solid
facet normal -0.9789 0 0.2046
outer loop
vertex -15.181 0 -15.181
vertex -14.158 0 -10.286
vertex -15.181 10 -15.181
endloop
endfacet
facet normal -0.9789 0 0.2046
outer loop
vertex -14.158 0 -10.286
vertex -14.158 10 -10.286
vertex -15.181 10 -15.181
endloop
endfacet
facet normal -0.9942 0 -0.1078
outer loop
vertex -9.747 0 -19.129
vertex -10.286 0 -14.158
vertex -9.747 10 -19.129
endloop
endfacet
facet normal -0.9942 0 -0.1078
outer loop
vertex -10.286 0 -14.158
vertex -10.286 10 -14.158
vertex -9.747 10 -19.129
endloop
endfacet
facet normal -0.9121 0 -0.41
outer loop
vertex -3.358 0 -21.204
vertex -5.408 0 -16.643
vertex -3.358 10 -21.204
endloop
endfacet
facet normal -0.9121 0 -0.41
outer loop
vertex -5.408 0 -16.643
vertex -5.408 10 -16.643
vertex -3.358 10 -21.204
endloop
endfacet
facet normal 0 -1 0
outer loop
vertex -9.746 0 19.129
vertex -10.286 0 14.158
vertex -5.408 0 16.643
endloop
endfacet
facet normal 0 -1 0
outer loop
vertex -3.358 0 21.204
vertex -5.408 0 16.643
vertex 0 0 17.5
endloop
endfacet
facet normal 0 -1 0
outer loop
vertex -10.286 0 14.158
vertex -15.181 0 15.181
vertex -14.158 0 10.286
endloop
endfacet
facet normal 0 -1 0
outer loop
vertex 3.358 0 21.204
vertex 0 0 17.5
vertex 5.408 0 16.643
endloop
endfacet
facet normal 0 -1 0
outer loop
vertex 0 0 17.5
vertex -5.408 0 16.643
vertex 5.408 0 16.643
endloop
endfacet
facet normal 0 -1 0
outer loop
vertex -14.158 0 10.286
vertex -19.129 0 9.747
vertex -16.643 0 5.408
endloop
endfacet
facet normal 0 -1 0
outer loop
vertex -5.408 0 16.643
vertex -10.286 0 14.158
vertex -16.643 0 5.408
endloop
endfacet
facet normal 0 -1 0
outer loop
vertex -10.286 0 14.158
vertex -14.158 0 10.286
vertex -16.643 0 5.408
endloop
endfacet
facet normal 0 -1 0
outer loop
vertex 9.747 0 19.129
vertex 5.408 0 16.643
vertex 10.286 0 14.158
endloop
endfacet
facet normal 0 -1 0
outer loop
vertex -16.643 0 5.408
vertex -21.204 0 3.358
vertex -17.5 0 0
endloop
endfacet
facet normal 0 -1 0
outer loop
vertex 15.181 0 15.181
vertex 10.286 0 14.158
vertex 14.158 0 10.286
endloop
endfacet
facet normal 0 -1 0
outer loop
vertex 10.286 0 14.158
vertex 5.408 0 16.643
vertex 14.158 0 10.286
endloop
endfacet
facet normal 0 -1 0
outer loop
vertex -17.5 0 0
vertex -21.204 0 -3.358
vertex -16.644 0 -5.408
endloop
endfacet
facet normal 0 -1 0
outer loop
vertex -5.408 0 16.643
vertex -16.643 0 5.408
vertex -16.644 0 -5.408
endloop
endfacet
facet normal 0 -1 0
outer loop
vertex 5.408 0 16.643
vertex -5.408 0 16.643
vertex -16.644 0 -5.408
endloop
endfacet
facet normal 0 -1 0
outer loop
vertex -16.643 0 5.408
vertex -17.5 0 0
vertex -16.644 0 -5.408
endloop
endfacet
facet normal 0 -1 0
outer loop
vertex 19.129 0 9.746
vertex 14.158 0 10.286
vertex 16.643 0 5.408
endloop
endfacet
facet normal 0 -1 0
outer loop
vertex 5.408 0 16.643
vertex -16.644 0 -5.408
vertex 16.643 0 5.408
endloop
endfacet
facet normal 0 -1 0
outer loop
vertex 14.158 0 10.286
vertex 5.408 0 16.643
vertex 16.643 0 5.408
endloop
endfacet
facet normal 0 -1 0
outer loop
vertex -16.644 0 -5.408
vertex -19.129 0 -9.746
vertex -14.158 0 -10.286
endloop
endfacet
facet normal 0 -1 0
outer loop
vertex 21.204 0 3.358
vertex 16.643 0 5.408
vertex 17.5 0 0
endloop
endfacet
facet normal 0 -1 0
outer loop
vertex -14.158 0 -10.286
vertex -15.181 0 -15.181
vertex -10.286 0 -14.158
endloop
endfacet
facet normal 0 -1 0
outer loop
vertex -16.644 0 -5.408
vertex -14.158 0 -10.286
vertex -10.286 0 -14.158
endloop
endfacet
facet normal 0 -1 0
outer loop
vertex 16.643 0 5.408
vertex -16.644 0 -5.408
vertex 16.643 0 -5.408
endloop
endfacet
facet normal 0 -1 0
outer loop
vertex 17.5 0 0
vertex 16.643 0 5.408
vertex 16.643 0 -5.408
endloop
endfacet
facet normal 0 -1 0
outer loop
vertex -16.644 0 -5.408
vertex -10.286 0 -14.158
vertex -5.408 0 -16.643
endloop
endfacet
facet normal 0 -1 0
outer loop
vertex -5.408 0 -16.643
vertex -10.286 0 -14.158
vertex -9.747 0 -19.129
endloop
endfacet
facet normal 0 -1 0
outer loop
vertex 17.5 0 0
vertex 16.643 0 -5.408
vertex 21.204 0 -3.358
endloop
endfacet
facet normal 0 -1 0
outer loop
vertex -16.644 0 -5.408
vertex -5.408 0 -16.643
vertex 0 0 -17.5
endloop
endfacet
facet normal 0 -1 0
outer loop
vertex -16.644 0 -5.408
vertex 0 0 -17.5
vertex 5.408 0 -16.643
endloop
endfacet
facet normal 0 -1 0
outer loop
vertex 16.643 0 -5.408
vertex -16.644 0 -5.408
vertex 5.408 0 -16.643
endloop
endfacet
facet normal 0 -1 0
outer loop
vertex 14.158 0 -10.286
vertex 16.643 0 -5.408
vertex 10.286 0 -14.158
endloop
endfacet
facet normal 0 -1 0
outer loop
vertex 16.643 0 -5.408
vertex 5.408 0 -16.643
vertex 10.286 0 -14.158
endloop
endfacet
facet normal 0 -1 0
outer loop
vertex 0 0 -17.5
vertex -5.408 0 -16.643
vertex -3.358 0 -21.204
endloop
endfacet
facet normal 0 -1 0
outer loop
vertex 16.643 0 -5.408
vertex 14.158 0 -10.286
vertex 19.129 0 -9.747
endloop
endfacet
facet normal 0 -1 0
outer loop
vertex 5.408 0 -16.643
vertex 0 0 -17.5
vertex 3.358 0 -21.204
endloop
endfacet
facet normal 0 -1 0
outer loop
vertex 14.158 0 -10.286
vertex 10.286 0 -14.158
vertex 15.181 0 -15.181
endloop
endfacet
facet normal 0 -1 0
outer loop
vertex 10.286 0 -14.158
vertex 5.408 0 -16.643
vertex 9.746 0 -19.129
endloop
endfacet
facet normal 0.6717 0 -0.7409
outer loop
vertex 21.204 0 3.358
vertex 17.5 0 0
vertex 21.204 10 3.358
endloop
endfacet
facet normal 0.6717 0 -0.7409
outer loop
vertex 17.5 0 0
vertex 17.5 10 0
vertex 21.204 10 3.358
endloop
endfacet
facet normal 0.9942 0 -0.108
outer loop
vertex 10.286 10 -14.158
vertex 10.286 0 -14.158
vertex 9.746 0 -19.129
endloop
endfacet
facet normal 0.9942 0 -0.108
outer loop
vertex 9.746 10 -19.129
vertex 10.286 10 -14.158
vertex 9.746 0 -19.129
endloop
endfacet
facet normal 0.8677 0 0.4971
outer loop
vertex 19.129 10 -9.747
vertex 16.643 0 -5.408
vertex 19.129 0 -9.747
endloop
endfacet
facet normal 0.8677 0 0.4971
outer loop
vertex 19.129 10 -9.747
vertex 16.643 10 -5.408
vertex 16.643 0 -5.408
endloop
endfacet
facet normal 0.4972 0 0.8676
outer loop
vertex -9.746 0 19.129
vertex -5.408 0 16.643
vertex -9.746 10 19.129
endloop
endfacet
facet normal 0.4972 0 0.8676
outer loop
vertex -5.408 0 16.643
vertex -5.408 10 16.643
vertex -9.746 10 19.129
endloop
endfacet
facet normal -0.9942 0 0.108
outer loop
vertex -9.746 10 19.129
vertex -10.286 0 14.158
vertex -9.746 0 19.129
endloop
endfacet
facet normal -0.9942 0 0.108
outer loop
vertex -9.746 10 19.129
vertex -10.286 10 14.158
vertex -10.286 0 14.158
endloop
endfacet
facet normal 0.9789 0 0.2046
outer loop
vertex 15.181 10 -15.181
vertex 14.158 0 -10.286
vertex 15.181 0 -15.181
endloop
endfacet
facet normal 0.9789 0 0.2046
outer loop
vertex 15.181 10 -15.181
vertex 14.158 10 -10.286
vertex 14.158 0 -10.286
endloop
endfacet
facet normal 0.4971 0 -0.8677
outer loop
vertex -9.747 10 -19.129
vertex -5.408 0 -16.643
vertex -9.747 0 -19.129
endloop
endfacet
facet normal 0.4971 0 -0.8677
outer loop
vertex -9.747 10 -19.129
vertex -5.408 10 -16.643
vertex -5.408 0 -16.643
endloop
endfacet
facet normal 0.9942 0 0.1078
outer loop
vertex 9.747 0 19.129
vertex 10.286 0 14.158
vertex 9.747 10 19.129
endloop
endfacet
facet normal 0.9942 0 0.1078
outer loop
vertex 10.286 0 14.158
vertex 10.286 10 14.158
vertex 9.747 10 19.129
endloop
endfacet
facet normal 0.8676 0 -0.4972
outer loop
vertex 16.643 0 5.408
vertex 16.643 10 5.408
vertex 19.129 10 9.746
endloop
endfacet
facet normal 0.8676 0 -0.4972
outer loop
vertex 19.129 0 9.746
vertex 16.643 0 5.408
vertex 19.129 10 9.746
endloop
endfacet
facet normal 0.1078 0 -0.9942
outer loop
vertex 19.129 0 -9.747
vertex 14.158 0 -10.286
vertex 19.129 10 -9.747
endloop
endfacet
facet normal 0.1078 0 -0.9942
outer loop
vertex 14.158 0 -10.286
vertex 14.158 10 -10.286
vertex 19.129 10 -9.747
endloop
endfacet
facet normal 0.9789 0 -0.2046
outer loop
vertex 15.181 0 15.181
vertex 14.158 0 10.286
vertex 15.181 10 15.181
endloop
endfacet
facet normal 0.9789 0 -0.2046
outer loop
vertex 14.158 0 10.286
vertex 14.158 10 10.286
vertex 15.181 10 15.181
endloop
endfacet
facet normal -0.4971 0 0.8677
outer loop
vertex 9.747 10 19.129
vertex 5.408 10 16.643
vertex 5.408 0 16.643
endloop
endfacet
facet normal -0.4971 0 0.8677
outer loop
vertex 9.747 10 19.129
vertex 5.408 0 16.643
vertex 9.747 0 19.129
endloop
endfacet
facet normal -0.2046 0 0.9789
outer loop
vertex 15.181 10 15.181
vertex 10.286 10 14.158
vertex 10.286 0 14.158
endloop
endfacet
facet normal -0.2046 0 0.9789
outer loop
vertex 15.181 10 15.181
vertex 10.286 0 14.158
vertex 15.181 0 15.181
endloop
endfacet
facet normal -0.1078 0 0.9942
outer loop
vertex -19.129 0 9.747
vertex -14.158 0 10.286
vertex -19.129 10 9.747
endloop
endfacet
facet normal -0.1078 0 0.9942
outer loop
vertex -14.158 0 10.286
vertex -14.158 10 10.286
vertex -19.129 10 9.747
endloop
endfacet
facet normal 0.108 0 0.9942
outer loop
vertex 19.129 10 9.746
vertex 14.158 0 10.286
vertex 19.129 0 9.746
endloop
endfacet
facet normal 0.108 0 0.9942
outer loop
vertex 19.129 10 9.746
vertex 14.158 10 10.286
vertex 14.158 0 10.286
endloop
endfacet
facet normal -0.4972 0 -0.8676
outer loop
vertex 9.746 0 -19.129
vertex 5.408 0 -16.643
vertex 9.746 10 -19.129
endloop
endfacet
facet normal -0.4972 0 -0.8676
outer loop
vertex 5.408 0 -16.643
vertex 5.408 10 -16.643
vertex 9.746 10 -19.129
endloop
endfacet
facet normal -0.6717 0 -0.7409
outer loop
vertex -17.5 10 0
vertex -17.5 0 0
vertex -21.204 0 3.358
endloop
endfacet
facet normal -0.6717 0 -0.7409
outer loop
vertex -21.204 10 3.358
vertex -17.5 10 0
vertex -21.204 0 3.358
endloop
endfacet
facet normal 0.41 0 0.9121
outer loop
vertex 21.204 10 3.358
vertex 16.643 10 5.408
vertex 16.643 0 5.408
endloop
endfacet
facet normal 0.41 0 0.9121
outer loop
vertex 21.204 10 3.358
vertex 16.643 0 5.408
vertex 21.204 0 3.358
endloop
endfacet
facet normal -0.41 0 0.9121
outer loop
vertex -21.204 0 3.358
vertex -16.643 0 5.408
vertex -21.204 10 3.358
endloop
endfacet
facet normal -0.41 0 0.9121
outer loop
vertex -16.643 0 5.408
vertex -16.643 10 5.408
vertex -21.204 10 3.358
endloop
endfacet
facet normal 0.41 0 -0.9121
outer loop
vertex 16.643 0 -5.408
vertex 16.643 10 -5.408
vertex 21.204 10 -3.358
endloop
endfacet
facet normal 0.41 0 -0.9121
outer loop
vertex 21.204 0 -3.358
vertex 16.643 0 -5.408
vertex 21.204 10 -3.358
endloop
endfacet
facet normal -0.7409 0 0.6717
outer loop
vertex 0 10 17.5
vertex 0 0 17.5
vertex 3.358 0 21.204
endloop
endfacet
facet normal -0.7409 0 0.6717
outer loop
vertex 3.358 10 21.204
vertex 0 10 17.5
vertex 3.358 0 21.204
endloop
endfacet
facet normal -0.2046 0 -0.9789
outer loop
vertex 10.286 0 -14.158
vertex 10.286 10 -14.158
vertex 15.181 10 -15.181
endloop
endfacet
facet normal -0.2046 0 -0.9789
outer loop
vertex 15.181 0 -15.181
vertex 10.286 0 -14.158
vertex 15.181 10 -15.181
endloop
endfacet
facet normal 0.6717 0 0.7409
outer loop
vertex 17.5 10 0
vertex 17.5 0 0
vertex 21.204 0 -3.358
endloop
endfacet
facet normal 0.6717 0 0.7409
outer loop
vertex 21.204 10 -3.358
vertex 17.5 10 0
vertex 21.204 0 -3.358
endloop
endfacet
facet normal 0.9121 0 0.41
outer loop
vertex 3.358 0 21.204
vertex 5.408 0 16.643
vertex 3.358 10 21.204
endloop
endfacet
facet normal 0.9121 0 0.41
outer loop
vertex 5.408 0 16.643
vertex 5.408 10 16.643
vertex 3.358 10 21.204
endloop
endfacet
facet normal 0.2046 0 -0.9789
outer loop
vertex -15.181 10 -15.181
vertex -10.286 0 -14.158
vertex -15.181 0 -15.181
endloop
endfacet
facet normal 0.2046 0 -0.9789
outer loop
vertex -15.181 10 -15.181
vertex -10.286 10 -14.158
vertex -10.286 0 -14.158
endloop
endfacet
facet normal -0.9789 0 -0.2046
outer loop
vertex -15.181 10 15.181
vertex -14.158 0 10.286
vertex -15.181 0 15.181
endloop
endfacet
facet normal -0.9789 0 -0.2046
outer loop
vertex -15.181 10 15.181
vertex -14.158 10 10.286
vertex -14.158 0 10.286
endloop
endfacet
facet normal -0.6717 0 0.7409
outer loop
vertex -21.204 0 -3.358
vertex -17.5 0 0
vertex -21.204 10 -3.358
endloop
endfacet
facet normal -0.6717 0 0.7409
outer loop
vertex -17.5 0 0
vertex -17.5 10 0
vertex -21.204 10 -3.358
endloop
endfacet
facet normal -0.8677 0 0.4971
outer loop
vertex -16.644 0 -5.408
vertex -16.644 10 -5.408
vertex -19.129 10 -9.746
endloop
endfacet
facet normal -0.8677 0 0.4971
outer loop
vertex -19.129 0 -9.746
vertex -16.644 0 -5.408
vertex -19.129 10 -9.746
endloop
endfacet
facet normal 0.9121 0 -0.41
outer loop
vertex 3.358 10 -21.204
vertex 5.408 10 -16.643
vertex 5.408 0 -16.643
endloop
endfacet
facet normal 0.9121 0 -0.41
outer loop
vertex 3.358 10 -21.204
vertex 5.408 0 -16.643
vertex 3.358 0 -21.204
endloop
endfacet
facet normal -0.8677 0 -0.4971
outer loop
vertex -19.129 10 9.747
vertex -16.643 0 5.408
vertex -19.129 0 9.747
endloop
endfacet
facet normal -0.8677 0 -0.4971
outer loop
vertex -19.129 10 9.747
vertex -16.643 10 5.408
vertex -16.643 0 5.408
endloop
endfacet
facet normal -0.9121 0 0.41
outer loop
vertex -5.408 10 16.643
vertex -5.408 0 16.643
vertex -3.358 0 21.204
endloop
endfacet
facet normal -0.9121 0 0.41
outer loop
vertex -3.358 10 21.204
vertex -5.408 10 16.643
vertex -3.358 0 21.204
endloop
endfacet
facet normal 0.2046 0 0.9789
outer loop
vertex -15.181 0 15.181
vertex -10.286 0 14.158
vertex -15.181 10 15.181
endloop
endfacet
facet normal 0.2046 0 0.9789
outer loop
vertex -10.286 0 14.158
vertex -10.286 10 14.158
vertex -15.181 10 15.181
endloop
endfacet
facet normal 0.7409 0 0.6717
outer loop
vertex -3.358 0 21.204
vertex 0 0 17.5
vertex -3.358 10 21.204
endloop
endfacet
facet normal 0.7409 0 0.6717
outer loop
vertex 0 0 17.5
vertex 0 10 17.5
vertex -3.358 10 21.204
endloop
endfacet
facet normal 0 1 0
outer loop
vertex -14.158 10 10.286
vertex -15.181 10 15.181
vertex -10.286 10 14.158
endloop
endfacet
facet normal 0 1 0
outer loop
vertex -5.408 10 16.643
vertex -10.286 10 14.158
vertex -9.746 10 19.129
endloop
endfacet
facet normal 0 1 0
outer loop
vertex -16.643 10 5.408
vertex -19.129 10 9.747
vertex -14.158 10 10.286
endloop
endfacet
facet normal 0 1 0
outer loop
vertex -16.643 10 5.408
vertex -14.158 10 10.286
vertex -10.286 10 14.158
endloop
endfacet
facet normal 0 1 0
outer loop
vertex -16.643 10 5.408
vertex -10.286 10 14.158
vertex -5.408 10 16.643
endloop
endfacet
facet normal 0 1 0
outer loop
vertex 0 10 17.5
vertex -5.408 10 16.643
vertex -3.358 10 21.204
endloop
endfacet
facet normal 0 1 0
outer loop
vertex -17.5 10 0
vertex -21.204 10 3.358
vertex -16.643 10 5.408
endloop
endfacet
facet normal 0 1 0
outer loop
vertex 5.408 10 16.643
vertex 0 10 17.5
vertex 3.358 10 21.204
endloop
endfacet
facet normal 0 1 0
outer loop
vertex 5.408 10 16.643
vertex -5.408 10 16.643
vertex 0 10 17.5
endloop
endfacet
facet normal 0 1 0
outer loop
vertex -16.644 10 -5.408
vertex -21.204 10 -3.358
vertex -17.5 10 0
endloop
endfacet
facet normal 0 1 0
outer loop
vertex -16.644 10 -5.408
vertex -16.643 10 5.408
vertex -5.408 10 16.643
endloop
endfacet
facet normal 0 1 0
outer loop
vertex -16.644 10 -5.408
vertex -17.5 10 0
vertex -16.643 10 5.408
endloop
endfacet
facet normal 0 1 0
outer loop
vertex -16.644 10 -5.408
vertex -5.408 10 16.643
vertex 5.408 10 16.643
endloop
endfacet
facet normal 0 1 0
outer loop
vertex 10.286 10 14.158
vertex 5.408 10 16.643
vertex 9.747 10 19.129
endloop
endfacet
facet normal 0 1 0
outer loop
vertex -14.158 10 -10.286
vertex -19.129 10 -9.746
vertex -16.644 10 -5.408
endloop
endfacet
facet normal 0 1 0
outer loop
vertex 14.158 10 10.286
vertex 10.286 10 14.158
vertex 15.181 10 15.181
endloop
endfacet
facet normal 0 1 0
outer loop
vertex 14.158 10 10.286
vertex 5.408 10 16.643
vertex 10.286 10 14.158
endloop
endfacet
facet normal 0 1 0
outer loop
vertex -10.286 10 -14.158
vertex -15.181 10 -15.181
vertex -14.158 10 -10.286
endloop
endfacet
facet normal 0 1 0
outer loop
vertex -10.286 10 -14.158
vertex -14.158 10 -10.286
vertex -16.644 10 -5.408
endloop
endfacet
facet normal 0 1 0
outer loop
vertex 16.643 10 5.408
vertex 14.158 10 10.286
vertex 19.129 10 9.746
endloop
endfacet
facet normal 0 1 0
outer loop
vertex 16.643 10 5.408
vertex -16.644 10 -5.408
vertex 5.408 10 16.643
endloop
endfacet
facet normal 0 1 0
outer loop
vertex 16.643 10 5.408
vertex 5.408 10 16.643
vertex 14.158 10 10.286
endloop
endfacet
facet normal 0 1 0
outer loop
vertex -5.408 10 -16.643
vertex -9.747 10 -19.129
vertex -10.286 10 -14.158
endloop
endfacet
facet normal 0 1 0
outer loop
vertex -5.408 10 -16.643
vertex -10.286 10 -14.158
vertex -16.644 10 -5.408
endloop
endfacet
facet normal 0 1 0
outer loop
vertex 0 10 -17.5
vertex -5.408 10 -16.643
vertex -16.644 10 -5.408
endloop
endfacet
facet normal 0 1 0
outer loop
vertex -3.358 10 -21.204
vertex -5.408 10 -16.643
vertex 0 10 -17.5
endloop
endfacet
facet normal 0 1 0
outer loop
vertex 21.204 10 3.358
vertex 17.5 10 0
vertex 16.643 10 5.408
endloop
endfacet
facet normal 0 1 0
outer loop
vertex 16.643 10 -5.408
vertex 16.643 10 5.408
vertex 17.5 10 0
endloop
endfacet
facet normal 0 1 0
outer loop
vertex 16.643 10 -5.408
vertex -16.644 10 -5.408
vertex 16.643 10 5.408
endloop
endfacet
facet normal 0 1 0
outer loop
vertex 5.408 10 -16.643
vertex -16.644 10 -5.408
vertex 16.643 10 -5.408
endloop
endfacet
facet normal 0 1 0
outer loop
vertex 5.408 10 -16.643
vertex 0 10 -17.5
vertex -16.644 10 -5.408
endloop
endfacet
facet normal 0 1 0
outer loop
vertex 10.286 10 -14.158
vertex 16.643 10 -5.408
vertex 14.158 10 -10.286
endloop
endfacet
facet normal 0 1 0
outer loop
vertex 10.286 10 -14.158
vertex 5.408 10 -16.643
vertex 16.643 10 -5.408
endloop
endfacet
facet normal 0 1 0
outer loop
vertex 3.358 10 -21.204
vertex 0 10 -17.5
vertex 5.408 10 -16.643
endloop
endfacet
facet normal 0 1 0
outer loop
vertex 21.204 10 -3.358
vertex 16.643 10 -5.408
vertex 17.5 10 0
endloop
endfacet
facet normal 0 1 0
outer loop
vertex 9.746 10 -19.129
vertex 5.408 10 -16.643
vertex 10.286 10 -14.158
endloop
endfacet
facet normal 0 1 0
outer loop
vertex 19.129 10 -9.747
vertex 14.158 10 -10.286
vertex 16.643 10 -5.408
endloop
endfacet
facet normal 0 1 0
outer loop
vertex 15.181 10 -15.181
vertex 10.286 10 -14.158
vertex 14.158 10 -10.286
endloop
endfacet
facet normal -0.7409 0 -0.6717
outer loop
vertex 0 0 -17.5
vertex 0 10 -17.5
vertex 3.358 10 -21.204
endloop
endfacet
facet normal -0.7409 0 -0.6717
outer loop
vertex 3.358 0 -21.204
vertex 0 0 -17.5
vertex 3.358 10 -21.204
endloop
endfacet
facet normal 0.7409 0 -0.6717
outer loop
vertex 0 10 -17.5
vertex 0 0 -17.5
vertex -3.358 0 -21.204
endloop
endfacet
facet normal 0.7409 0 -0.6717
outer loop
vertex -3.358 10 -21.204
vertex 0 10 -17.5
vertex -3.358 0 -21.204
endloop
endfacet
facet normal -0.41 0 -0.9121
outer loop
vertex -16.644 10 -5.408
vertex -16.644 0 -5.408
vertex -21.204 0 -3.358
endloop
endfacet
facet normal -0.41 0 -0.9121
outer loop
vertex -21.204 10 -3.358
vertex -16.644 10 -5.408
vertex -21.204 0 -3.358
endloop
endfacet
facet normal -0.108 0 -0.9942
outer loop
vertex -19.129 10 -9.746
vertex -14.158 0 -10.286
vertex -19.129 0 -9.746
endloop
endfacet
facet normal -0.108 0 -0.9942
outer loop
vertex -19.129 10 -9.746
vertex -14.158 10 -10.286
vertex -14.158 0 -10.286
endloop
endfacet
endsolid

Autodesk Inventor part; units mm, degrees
ref_plane "YZ Plane" through (0, 0, 0) normal (1, 0, 0) x (0, 1, 0)
ref_plane "XZ Plane" through (0, 0, 0) normal (0, 1, 0) x (-1, 0, 0)
ref_plane "XY Plane" through (0, 0, 0) normal (0, 0, 1) x (1, 0, 0)
sketch "Sketch1" plane through (0, 0, 0) normal (0, 1, 0) x (-1, 0, 0)
  circle A0 centre (0, 0) radius 17.5
  dimension "d0" = 35
extrude "Base" add sketch "Sketch1" along normal blind 10
sketch "Sketch2" plane through (0, 10, 0) normal (0, 1, 0) x (1, 0, 0)
  circle A0 centre (0, 0) radius 8
  circle A1 centre (-8, 0) radius 0.8
  dimension "d3" = 16
  dimension "d4" = 1.6
extrude "Mounting Hole" cut sketch "Sketch2" against normal through all contours A1 A0 | A0 A1 picked at (-7.7304, 0) picked at (-8.2616, 0.0332)
pattern_circular "Circular Pattern1" count 8 over 360 about axis through (0, 0, 0) along (0, 1, 0) of "Mounting Hole"
sketch "Sketch3" plane through (0, 10, 0) normal (0, 1, 0) x (1, 0, 0)
  arc A0 (-16.6435, 5.4078) -> (-17.5, 0) centre (0, 0) ccw
  line L0 (0, 0) -> (-16.6435, 5.4078) construction
  line L1 (0, 0) -> (-17.5, 0) construction
  line L2 (0, 0) -> (-25.2614, 4.001)
  line L3 (0, 0) -> (25.5763, 0) construction
  line L4 (-17.5, 0) -> (-21.2042, 3.3584)
  line L5 (-16.6435, 5.4078) -> (-21.2042, 3.3584)
  dimension "d11" = 18
  dimension "d12" = 171
  dimension "d13" = 5
extrude "Gear Tooth" add sketch "Sketch3" against normal blind 10
pattern_circular "Circular Pattern2" count 20 over 360 about axis through (0, 0, 0) along (0, 1, 0) of "Gear Tooth"
sketch "Sketch6" plane through (0, 10, 0) normal (0, 1, 0) x (1, 0, 0)
  point P0 (0, 0)
sketch "Sketch7" plane through (0, 10, 0) normal (0, 1, 0) x (1, 0, 0)
  circle A0 centre (0, 0) radius 10
  dimension "d26" = 20
extrude "Extrusion6" cut sketch "Sketch7" against normal blind 2
sketch "Sketch8" plane through (0, 8, 0) normal (0, 1, 0) x (1, 0, 0)
  circle A0 centre (0, 0) radius 4
  dimension "d29" = 8
extrude "Extrusion7" cut sketch "Sketch8" against normal blind 1.9
sketch "Sketch9" plane through (0, 6.1, 0) normal (0, 1, 0) x (1, 0, 0)
  circle A0 centre (0, 0) radius 2.25
  dimension "d32" = 4.5
extrude "Extrusion8" cut sketch "Sketch9" against normal blind 2.5
sketch "Sketch10" plane through (0, 10, 0) normal (0, 1, 0) x (1, 0, 0)
  circle A0 centre (0, 0) radius 10
extrude "Extrusion9" add sketch "Sketch10" against normal blind 10
properties part number "BarMountSmallGear"
